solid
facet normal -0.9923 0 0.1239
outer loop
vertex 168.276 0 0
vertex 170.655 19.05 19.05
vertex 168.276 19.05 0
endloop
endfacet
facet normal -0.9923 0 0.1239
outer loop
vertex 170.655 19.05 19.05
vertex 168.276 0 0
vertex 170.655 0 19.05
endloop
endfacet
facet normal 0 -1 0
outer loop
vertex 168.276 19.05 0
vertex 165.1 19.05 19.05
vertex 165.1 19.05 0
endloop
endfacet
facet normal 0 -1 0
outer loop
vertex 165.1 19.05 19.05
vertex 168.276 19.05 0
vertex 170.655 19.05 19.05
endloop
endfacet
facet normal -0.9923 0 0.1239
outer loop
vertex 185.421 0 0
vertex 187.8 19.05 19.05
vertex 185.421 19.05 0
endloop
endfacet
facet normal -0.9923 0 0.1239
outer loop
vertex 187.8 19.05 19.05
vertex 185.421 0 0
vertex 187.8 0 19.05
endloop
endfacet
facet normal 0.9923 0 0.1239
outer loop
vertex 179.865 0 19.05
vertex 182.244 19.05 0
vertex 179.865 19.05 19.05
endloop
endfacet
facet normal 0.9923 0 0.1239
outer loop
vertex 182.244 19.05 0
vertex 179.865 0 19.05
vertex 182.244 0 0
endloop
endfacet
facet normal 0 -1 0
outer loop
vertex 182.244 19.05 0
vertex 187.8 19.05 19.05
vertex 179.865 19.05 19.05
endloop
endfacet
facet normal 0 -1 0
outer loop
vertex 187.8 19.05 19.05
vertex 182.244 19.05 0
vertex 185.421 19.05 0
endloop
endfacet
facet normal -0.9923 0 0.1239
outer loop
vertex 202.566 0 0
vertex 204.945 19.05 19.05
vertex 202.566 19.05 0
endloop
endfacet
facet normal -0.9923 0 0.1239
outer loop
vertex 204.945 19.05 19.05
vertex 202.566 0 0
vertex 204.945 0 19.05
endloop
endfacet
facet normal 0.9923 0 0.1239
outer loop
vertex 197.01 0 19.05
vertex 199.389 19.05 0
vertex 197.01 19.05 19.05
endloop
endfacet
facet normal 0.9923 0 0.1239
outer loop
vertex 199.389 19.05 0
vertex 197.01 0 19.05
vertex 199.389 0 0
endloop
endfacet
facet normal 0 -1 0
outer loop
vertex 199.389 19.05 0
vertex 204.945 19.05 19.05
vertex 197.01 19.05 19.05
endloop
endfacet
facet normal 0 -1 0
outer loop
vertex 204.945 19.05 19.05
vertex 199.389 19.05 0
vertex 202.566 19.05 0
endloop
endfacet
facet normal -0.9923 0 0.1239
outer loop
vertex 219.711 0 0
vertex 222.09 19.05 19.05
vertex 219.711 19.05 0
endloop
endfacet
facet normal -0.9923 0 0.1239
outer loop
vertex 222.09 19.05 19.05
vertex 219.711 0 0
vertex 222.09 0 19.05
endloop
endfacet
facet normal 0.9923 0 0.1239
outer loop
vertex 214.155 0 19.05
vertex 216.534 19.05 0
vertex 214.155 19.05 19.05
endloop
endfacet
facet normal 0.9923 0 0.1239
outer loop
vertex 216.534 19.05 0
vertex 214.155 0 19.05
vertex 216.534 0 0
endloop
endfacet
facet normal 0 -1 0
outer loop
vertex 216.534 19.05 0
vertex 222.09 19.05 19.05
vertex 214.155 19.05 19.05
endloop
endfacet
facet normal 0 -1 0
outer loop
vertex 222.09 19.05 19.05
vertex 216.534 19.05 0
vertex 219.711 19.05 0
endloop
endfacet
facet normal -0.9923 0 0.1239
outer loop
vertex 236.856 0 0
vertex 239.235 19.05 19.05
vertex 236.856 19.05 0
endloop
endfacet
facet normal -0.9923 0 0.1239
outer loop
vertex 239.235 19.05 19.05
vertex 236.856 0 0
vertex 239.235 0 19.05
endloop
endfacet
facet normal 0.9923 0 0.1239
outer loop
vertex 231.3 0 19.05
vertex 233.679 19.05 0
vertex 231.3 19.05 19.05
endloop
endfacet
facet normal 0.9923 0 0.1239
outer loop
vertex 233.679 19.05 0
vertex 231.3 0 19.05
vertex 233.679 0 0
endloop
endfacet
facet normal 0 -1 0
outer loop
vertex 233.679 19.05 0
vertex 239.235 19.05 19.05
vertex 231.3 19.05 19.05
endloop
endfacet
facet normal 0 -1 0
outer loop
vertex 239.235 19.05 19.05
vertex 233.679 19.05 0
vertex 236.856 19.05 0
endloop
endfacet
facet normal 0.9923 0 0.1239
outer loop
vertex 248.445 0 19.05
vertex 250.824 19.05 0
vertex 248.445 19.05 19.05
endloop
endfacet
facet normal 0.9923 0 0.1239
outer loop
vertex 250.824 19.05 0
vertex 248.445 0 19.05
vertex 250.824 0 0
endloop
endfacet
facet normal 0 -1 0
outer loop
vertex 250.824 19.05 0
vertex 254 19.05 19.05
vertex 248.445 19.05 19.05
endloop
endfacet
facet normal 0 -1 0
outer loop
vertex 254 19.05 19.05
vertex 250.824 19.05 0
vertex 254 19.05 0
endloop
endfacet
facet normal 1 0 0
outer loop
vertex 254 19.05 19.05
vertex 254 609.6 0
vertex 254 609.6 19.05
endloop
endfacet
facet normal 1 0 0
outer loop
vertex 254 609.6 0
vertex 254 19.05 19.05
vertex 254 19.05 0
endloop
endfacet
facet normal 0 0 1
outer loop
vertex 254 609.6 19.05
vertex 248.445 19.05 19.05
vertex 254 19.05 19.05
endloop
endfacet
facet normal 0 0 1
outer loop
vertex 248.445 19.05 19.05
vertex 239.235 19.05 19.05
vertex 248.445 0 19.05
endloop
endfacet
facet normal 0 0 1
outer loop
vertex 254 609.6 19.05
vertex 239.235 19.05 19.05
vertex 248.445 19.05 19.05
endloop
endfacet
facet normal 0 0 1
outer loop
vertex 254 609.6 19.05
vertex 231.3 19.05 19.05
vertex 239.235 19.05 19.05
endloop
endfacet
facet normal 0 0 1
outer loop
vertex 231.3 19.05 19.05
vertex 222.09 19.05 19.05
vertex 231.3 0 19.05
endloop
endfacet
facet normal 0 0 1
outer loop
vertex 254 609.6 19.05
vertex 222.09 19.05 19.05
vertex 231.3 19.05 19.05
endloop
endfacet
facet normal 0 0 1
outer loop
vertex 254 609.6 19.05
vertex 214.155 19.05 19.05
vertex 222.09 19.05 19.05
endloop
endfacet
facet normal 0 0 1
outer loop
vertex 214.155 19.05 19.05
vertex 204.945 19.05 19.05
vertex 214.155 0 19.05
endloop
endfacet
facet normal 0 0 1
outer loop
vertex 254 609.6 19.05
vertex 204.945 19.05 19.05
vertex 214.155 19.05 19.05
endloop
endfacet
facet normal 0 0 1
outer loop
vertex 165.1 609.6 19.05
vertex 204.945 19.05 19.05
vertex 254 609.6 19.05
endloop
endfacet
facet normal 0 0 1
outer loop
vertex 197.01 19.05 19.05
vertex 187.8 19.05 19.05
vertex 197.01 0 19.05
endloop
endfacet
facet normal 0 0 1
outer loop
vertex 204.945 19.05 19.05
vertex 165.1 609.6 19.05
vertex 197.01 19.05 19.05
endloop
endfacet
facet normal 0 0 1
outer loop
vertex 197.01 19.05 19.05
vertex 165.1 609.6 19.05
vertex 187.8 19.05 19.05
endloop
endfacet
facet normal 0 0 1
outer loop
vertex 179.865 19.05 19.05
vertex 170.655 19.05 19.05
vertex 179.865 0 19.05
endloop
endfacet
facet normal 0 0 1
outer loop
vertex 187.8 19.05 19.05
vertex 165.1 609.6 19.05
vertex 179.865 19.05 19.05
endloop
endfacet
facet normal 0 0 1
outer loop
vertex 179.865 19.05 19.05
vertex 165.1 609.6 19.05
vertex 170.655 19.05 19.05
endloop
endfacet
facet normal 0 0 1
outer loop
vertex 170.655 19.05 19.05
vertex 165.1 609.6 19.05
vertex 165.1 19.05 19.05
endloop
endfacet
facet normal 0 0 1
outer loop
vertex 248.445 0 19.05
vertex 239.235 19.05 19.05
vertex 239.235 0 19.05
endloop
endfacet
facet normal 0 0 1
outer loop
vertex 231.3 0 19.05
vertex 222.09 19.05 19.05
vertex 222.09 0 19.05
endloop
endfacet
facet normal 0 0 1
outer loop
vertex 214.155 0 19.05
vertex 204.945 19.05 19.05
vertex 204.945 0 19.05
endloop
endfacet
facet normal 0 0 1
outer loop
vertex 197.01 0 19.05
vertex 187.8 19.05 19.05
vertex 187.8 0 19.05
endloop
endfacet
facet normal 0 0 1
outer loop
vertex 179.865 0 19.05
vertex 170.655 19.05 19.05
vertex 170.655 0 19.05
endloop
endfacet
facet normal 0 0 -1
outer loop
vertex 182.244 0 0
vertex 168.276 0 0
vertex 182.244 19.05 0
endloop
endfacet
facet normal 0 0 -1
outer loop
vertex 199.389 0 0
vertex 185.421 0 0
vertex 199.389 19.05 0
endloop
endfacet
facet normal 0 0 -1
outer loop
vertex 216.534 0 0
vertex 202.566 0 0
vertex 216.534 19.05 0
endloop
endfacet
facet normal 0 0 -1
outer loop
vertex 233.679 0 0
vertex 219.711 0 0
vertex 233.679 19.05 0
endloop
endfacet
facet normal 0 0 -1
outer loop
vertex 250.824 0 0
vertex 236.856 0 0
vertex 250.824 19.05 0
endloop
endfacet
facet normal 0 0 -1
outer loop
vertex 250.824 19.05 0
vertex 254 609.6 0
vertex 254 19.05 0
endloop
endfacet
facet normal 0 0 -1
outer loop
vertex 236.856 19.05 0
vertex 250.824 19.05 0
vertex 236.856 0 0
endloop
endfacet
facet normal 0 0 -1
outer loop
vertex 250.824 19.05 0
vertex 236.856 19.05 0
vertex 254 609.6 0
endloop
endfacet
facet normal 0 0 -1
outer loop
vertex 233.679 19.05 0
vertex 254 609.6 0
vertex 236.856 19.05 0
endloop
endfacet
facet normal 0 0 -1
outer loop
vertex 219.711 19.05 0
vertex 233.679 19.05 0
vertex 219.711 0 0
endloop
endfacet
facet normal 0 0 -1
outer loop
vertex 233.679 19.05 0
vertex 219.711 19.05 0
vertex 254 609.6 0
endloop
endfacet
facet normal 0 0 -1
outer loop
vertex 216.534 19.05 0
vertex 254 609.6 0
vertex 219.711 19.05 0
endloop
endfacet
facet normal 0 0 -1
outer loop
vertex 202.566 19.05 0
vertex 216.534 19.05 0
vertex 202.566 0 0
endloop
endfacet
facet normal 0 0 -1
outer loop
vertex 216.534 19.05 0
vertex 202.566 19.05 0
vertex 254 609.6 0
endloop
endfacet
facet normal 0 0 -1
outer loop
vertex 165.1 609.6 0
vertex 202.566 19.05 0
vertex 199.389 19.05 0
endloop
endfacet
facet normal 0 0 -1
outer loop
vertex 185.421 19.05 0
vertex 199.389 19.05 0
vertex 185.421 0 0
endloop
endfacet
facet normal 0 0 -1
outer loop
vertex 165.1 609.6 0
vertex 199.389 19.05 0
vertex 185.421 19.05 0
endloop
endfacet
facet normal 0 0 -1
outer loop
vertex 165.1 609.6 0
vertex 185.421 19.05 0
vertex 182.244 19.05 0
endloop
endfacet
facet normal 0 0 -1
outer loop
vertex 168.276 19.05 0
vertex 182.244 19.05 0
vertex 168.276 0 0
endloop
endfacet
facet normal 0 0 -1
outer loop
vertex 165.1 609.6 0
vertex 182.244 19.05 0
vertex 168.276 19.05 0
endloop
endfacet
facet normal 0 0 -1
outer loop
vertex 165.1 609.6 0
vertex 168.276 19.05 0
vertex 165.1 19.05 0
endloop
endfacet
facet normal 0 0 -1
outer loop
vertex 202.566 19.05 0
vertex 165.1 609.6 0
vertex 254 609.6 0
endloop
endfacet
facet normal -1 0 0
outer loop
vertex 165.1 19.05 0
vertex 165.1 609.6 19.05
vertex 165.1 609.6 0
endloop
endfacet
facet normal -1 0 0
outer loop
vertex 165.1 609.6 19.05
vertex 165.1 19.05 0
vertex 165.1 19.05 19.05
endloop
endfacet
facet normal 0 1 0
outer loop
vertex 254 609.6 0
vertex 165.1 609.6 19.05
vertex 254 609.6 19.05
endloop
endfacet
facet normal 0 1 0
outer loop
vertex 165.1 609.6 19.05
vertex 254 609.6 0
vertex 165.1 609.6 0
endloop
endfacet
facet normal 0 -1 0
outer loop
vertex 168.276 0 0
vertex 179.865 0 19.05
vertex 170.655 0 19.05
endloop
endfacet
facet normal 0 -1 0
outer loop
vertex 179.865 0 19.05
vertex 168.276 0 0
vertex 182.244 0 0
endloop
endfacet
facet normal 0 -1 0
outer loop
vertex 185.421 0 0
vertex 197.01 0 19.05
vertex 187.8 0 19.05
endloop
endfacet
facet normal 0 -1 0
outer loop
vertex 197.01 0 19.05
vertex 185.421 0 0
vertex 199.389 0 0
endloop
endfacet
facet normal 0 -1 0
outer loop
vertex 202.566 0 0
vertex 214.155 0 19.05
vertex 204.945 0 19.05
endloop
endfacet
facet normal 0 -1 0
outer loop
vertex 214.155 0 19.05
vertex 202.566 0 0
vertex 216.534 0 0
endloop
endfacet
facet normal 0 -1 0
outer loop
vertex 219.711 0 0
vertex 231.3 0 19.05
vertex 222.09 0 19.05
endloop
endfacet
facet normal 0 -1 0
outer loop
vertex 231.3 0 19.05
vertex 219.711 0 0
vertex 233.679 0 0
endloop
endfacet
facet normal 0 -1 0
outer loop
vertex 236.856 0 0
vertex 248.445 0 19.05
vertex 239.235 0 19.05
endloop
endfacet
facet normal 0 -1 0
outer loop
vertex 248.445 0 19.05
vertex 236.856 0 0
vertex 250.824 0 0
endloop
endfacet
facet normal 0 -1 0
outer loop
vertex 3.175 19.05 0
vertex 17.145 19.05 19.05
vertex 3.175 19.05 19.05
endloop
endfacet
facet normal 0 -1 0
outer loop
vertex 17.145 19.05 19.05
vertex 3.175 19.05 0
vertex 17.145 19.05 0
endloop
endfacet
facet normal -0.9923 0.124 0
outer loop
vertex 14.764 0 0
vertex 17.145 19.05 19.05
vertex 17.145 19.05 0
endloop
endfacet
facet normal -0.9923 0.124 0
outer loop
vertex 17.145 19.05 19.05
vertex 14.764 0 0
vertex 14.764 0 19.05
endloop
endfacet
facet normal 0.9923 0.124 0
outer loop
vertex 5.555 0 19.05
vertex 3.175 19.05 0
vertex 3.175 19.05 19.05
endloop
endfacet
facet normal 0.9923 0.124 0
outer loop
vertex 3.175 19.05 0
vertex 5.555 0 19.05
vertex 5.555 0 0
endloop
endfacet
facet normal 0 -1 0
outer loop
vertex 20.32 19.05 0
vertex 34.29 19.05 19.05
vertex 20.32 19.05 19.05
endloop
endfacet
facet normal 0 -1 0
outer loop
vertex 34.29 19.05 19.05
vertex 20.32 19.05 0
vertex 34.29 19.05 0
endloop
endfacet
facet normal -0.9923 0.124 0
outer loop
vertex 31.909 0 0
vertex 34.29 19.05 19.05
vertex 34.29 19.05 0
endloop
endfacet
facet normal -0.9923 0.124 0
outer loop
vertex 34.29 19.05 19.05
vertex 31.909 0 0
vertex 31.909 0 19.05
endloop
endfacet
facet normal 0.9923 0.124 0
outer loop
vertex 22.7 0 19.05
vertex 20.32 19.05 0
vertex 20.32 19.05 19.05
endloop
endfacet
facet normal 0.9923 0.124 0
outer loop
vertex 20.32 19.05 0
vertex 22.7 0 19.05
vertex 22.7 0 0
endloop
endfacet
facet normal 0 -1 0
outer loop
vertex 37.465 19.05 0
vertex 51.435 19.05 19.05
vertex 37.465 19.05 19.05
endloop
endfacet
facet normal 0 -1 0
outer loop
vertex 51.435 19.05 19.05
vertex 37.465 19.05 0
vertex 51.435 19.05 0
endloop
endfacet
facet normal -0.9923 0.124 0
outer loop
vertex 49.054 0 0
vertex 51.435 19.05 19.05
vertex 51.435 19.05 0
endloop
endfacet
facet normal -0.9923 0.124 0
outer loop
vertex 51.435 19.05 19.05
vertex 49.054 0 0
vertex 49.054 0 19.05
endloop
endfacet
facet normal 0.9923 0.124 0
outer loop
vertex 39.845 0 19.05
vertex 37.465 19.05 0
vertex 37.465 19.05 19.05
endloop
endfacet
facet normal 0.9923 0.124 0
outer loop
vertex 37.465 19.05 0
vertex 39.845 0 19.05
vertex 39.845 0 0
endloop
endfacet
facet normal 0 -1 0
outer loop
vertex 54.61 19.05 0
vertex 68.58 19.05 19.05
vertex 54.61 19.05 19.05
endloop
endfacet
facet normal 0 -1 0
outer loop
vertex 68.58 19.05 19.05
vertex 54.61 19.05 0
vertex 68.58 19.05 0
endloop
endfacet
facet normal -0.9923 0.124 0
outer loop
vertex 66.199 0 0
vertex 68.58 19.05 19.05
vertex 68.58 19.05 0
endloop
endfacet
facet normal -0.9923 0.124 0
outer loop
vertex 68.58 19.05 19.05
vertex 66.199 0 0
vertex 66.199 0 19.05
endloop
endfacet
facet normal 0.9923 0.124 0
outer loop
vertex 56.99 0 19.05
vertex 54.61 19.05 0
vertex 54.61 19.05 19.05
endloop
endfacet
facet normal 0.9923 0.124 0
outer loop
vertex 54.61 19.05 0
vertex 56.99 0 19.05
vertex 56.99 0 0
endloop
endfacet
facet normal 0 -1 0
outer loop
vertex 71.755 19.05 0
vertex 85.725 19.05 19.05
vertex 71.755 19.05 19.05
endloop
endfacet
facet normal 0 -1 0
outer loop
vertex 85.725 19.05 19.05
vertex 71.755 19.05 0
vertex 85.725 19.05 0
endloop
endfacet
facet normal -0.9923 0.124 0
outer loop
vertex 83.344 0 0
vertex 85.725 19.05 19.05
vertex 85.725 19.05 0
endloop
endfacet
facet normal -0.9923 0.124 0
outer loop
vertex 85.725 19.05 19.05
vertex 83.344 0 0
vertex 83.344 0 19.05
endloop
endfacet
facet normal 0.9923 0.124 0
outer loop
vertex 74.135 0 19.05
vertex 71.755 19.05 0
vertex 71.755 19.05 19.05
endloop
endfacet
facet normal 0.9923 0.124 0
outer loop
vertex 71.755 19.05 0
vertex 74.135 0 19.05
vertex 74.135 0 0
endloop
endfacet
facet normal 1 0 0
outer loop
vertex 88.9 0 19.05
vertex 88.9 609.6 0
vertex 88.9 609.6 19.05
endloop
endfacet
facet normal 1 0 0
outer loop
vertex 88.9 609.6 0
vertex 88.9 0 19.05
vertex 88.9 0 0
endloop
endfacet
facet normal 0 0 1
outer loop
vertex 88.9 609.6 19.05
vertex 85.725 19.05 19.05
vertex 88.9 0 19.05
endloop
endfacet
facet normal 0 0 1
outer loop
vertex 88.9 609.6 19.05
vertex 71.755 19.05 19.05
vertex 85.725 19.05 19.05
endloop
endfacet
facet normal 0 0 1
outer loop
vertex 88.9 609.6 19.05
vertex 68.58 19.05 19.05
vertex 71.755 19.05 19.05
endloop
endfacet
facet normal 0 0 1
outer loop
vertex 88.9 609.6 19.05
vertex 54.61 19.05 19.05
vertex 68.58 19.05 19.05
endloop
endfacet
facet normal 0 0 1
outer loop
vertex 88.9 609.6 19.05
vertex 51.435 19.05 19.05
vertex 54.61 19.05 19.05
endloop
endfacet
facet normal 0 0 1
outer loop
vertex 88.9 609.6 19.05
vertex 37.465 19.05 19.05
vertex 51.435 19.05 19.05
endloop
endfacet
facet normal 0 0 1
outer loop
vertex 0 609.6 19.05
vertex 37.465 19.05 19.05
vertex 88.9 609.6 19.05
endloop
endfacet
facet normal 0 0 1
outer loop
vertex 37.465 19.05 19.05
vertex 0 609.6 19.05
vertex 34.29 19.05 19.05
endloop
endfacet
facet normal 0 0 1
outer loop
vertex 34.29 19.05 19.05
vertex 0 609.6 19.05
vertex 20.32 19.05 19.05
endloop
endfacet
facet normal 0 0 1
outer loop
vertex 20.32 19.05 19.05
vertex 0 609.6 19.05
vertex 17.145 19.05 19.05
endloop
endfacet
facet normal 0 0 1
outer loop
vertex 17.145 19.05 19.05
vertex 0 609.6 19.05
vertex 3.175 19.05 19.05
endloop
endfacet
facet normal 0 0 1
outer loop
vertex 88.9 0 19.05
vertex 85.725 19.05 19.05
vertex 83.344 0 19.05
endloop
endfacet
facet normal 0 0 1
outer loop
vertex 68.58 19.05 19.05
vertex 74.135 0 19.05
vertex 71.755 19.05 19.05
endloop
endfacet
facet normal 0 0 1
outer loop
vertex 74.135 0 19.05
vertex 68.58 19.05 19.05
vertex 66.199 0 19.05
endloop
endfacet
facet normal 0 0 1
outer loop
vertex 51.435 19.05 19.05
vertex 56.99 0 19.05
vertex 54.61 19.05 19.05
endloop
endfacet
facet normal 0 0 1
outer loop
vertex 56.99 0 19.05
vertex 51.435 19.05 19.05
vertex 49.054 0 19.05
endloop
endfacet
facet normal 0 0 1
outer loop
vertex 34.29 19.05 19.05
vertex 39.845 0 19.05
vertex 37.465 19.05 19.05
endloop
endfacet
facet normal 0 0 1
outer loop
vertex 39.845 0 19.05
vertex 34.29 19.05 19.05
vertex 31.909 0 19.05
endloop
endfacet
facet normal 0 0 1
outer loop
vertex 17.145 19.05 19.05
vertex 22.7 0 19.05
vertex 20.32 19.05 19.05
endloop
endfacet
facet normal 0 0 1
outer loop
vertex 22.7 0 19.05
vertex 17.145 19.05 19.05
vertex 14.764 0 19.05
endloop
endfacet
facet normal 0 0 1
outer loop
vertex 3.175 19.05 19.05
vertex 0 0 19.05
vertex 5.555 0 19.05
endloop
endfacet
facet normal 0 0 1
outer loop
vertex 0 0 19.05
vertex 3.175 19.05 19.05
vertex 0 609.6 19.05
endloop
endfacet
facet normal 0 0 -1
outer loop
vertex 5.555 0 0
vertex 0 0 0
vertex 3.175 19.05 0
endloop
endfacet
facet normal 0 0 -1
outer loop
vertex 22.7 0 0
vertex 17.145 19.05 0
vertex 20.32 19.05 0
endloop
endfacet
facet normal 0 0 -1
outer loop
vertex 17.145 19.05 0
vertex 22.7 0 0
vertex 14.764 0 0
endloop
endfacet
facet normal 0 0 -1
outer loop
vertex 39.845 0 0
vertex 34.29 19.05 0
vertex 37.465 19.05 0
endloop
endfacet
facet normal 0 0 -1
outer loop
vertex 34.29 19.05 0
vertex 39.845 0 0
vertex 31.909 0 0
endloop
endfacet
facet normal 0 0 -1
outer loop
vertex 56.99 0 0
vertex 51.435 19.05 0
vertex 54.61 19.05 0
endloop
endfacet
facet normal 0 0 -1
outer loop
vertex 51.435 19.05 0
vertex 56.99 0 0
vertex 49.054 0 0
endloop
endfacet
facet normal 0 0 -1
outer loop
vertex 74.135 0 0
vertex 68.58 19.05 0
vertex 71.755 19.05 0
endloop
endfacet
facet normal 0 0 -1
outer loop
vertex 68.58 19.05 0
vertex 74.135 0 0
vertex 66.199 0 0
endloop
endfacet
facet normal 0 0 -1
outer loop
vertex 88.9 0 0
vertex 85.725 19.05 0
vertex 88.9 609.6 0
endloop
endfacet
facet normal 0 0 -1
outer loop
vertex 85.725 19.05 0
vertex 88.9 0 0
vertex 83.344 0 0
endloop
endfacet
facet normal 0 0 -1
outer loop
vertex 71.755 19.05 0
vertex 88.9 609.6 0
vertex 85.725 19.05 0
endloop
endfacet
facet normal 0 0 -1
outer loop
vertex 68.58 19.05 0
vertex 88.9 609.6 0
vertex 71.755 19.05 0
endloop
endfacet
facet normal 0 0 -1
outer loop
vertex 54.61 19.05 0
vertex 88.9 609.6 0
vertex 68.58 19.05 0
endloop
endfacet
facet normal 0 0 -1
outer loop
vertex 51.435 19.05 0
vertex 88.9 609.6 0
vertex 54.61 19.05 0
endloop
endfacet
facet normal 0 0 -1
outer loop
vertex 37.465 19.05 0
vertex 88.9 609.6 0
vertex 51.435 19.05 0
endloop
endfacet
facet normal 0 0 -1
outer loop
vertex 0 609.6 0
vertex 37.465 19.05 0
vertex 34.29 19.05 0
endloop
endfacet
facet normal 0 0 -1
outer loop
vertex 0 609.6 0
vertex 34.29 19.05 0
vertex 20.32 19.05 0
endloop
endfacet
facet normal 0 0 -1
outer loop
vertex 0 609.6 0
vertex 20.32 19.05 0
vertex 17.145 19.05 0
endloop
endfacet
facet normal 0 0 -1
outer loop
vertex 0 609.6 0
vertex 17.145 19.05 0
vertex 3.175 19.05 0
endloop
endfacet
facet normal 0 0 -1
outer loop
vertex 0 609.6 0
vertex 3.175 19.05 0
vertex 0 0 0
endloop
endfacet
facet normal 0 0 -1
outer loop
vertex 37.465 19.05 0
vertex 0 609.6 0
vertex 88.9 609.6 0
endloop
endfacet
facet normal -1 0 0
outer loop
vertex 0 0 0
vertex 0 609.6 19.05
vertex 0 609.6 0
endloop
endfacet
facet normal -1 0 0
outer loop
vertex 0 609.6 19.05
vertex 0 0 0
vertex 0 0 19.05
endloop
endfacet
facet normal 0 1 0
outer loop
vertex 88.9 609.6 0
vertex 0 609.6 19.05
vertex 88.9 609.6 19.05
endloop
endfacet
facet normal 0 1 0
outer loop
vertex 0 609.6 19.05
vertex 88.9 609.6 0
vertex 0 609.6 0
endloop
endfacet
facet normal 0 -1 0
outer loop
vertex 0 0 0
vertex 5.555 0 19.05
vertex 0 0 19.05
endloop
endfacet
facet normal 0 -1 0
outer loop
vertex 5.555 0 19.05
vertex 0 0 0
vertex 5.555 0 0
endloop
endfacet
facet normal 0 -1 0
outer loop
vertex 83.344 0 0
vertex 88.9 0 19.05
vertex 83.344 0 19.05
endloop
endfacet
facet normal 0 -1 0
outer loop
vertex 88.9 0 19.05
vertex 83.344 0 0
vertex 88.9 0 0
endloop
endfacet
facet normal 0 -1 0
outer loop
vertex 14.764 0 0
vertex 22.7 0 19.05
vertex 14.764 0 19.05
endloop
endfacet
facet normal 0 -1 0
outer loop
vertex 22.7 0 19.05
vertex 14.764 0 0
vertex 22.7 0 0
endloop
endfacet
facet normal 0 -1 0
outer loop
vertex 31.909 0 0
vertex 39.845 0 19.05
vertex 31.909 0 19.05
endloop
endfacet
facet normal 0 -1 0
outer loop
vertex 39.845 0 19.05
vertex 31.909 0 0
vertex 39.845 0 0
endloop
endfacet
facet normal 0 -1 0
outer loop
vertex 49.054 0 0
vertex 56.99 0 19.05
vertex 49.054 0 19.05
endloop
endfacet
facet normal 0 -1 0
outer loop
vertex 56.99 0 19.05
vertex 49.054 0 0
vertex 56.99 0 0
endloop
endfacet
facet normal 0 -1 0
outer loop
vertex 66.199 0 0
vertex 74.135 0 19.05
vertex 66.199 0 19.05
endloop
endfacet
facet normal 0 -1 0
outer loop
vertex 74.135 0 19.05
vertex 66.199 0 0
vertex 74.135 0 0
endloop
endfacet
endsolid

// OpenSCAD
/*
Parametric dovetail cuts for CNC operations on wood.

To export to STL, use the follow command as a template:

    $ openscad -D PART=\"pins\" -D DOVETAILS=6 -D STOCK_WIDTH="3.5 * INCH" -o pins.stl dovetails.scad


Dovetail layout nspired by: http://www.startwoodworking.com/post/laying-out-dovetails


    This program is free software: you can redistribute it and/or modify
    it under the terms of the GNU General Public License as published by
    the Free Software Foundation, either version 3 of the License, or
    (at your option) any later version.

    This program is distributed in the hope that it will be useful,
    but WITHOUT ANY WARRANTY; without even the implied warranty of
    MERCHANTABILITY or FITNESS FOR A PARTICULAR PURPOSE.  See the
    GNU General Public License for more details.

    You should have received a copy of the GNU General Public License
    along with this program.  If not, see <https://www.gnu.org/licenses/>.
*/

// INCH constant in mm
INCH = 25.4;

// stock size
STOCK_THICKNESS = 0.75 * INCH;
STOCK_WIDTH     = 3.5  * INCH;
STOCK_LENGTH    = 24   * INCH;  // for asthetics; does not affect calculations

// how many dovetails
DOVETAILS = 5;

// how wide you want the narrow end of the pins (the tails will adjust)
// Recommended: 1/8" to 1/4", but you can go wider if you want
PIN_WIDTH = 0.125 * INCH;

// at what angle will the cuts be
// 8:1 or 6:1 (hardwoods or softwoods, respectively) ratio for the angle are common.
// HINT: take the arctangent of the fraction of your ratio to find the angle
ANGLE = atan(8/1);

//  Which part to display.
// Values can be one of:
//              "all": both boards are created
//              "pins": only board with pins is created
//              "tails": only board with tails is created
PART = "all";

// whether to render stock pieces as intersecting or apart
STOCK_INTERSECT = false;

// widths of each end of the pin
function pin_width_wide() = pin_width_narrow() + 2*(STOCK_THICKNESS/tan(ANGLE));
//function pin_width_wide() = STOCK_WIDTH/DOVETAILS*(R[1]/(R[0]+R[1]));
function pin_width_narrow() = PIN_WIDTH;

// widths of each end of the tail
function tail_width_wide() = (STOCK_WIDTH - pin_width_narrow()*(DOVETAILS+1))/DOVETAILS;
function tail_width_narrow() = tail_width_wide() - 2*(STOCK_THICKNESS/tan(ANGLE));

// width of where the tail and pin overlap
function tail_pin_overlap_width() = (tail_width_wide() - tail_width_narrow())/2;

// stock piece
module _stock() {
    cube(size=[STOCK_WIDTH, STOCK_LENGTH, STOCK_THICKNESS]);
}

// stock piece for pins
module pins_stock() {
    color("BurlyWood") _stock();
}

// stock piece for tails
module tails_stock() {
    color("SaddleBrown") _move_pins_or_pin_stock() _stock();
}

// tail solid model
module tail(cutter=true) {
    wide = tail_width_wide();
    narrow = tail_width_narrow();
    overlap = tail_pin_overlap_width();
    stock = STOCK_THICKNESS;
    extend = cutter ? 0.01 : 0.00;  // extend shape out a little in x, y, and z for better cutting results
    points = [[0, 0 -extend], [narrow, 0], [narrow + overlap, stock], [-overlap, stock]];
    translate([overlap, 0, -extend]) linear_extrude(height=stock + (2 * extend)) polygon(points=points);
}

// pin solid model
module pin(cutter=true) {
    wide = pin_width_wide();
    narrow = pin_width_narrow();
    overlap = tail_pin_overlap_width();
    stock = STOCK_THICKNESS;
    extend = cutter ? 0.01 : 0.00;  // extend shape out a little in x, y, and z for better cutting results
    points = [[0, -extend], [wide, -extend], [wide - overlap, stock + extend], [overlap, stock + extend]];
    translate([0, stock, 0]) rotate([90, 0, 0]) linear_extrude(height=stock + extend) polygon(points=points);
}

// DOVETAIL number of tails produced at proper spacing and positioning along stock edge
module tails_array() {
    offset = pin_width_narrow();
    for ( i = [0:DOVETAILS -1] ) {
        shift = (tail_width_wide()+ pin_width_narrow())*i;
        translate([offset + shift, 0, 0]) tail();
    }
}

module pins_array() {
    offset = -tail_pin_overlap_width();
    for ( i = [0:DOVETAILS] ) {
        shift = (tail_width_wide()+ pin_width_narrow())*i;
        _move_pins_or_pin_stock() translate([offset + shift, 0, 0]) pin();
    }
}

// moves a pin or the pin stock to the right location based on STOCK_INTERSECT value
module _move_pins_or_pin_stock() {
    if (STOCK_INTERSECT) {
        translate([0, 0, STOCK_THICKNESS]) rotate([-90, 0, 0]) children();
    } else {
        translate([STOCK_WIDTH + (3 * INCH), 0, 0]) children();
    }            
}

module pins_board() {
    color("SaddleBrown") difference() {
        pins_stock();
        tails_array();
    }
}

module tails_board() {
    color("BurlyWood") difference() {
        tails_stock();
        mirror([0, 0, STOCK_THICKNESS]) translate([0, 0, -STOCK_THICKNESS]) pins_array();
    }
}


if (PART == "all") {
    tails_board();
    pins_board();
} else if (PART == "tails") {
    tails_board();
} else if (PART == "pins") {
    pins_board();
}
